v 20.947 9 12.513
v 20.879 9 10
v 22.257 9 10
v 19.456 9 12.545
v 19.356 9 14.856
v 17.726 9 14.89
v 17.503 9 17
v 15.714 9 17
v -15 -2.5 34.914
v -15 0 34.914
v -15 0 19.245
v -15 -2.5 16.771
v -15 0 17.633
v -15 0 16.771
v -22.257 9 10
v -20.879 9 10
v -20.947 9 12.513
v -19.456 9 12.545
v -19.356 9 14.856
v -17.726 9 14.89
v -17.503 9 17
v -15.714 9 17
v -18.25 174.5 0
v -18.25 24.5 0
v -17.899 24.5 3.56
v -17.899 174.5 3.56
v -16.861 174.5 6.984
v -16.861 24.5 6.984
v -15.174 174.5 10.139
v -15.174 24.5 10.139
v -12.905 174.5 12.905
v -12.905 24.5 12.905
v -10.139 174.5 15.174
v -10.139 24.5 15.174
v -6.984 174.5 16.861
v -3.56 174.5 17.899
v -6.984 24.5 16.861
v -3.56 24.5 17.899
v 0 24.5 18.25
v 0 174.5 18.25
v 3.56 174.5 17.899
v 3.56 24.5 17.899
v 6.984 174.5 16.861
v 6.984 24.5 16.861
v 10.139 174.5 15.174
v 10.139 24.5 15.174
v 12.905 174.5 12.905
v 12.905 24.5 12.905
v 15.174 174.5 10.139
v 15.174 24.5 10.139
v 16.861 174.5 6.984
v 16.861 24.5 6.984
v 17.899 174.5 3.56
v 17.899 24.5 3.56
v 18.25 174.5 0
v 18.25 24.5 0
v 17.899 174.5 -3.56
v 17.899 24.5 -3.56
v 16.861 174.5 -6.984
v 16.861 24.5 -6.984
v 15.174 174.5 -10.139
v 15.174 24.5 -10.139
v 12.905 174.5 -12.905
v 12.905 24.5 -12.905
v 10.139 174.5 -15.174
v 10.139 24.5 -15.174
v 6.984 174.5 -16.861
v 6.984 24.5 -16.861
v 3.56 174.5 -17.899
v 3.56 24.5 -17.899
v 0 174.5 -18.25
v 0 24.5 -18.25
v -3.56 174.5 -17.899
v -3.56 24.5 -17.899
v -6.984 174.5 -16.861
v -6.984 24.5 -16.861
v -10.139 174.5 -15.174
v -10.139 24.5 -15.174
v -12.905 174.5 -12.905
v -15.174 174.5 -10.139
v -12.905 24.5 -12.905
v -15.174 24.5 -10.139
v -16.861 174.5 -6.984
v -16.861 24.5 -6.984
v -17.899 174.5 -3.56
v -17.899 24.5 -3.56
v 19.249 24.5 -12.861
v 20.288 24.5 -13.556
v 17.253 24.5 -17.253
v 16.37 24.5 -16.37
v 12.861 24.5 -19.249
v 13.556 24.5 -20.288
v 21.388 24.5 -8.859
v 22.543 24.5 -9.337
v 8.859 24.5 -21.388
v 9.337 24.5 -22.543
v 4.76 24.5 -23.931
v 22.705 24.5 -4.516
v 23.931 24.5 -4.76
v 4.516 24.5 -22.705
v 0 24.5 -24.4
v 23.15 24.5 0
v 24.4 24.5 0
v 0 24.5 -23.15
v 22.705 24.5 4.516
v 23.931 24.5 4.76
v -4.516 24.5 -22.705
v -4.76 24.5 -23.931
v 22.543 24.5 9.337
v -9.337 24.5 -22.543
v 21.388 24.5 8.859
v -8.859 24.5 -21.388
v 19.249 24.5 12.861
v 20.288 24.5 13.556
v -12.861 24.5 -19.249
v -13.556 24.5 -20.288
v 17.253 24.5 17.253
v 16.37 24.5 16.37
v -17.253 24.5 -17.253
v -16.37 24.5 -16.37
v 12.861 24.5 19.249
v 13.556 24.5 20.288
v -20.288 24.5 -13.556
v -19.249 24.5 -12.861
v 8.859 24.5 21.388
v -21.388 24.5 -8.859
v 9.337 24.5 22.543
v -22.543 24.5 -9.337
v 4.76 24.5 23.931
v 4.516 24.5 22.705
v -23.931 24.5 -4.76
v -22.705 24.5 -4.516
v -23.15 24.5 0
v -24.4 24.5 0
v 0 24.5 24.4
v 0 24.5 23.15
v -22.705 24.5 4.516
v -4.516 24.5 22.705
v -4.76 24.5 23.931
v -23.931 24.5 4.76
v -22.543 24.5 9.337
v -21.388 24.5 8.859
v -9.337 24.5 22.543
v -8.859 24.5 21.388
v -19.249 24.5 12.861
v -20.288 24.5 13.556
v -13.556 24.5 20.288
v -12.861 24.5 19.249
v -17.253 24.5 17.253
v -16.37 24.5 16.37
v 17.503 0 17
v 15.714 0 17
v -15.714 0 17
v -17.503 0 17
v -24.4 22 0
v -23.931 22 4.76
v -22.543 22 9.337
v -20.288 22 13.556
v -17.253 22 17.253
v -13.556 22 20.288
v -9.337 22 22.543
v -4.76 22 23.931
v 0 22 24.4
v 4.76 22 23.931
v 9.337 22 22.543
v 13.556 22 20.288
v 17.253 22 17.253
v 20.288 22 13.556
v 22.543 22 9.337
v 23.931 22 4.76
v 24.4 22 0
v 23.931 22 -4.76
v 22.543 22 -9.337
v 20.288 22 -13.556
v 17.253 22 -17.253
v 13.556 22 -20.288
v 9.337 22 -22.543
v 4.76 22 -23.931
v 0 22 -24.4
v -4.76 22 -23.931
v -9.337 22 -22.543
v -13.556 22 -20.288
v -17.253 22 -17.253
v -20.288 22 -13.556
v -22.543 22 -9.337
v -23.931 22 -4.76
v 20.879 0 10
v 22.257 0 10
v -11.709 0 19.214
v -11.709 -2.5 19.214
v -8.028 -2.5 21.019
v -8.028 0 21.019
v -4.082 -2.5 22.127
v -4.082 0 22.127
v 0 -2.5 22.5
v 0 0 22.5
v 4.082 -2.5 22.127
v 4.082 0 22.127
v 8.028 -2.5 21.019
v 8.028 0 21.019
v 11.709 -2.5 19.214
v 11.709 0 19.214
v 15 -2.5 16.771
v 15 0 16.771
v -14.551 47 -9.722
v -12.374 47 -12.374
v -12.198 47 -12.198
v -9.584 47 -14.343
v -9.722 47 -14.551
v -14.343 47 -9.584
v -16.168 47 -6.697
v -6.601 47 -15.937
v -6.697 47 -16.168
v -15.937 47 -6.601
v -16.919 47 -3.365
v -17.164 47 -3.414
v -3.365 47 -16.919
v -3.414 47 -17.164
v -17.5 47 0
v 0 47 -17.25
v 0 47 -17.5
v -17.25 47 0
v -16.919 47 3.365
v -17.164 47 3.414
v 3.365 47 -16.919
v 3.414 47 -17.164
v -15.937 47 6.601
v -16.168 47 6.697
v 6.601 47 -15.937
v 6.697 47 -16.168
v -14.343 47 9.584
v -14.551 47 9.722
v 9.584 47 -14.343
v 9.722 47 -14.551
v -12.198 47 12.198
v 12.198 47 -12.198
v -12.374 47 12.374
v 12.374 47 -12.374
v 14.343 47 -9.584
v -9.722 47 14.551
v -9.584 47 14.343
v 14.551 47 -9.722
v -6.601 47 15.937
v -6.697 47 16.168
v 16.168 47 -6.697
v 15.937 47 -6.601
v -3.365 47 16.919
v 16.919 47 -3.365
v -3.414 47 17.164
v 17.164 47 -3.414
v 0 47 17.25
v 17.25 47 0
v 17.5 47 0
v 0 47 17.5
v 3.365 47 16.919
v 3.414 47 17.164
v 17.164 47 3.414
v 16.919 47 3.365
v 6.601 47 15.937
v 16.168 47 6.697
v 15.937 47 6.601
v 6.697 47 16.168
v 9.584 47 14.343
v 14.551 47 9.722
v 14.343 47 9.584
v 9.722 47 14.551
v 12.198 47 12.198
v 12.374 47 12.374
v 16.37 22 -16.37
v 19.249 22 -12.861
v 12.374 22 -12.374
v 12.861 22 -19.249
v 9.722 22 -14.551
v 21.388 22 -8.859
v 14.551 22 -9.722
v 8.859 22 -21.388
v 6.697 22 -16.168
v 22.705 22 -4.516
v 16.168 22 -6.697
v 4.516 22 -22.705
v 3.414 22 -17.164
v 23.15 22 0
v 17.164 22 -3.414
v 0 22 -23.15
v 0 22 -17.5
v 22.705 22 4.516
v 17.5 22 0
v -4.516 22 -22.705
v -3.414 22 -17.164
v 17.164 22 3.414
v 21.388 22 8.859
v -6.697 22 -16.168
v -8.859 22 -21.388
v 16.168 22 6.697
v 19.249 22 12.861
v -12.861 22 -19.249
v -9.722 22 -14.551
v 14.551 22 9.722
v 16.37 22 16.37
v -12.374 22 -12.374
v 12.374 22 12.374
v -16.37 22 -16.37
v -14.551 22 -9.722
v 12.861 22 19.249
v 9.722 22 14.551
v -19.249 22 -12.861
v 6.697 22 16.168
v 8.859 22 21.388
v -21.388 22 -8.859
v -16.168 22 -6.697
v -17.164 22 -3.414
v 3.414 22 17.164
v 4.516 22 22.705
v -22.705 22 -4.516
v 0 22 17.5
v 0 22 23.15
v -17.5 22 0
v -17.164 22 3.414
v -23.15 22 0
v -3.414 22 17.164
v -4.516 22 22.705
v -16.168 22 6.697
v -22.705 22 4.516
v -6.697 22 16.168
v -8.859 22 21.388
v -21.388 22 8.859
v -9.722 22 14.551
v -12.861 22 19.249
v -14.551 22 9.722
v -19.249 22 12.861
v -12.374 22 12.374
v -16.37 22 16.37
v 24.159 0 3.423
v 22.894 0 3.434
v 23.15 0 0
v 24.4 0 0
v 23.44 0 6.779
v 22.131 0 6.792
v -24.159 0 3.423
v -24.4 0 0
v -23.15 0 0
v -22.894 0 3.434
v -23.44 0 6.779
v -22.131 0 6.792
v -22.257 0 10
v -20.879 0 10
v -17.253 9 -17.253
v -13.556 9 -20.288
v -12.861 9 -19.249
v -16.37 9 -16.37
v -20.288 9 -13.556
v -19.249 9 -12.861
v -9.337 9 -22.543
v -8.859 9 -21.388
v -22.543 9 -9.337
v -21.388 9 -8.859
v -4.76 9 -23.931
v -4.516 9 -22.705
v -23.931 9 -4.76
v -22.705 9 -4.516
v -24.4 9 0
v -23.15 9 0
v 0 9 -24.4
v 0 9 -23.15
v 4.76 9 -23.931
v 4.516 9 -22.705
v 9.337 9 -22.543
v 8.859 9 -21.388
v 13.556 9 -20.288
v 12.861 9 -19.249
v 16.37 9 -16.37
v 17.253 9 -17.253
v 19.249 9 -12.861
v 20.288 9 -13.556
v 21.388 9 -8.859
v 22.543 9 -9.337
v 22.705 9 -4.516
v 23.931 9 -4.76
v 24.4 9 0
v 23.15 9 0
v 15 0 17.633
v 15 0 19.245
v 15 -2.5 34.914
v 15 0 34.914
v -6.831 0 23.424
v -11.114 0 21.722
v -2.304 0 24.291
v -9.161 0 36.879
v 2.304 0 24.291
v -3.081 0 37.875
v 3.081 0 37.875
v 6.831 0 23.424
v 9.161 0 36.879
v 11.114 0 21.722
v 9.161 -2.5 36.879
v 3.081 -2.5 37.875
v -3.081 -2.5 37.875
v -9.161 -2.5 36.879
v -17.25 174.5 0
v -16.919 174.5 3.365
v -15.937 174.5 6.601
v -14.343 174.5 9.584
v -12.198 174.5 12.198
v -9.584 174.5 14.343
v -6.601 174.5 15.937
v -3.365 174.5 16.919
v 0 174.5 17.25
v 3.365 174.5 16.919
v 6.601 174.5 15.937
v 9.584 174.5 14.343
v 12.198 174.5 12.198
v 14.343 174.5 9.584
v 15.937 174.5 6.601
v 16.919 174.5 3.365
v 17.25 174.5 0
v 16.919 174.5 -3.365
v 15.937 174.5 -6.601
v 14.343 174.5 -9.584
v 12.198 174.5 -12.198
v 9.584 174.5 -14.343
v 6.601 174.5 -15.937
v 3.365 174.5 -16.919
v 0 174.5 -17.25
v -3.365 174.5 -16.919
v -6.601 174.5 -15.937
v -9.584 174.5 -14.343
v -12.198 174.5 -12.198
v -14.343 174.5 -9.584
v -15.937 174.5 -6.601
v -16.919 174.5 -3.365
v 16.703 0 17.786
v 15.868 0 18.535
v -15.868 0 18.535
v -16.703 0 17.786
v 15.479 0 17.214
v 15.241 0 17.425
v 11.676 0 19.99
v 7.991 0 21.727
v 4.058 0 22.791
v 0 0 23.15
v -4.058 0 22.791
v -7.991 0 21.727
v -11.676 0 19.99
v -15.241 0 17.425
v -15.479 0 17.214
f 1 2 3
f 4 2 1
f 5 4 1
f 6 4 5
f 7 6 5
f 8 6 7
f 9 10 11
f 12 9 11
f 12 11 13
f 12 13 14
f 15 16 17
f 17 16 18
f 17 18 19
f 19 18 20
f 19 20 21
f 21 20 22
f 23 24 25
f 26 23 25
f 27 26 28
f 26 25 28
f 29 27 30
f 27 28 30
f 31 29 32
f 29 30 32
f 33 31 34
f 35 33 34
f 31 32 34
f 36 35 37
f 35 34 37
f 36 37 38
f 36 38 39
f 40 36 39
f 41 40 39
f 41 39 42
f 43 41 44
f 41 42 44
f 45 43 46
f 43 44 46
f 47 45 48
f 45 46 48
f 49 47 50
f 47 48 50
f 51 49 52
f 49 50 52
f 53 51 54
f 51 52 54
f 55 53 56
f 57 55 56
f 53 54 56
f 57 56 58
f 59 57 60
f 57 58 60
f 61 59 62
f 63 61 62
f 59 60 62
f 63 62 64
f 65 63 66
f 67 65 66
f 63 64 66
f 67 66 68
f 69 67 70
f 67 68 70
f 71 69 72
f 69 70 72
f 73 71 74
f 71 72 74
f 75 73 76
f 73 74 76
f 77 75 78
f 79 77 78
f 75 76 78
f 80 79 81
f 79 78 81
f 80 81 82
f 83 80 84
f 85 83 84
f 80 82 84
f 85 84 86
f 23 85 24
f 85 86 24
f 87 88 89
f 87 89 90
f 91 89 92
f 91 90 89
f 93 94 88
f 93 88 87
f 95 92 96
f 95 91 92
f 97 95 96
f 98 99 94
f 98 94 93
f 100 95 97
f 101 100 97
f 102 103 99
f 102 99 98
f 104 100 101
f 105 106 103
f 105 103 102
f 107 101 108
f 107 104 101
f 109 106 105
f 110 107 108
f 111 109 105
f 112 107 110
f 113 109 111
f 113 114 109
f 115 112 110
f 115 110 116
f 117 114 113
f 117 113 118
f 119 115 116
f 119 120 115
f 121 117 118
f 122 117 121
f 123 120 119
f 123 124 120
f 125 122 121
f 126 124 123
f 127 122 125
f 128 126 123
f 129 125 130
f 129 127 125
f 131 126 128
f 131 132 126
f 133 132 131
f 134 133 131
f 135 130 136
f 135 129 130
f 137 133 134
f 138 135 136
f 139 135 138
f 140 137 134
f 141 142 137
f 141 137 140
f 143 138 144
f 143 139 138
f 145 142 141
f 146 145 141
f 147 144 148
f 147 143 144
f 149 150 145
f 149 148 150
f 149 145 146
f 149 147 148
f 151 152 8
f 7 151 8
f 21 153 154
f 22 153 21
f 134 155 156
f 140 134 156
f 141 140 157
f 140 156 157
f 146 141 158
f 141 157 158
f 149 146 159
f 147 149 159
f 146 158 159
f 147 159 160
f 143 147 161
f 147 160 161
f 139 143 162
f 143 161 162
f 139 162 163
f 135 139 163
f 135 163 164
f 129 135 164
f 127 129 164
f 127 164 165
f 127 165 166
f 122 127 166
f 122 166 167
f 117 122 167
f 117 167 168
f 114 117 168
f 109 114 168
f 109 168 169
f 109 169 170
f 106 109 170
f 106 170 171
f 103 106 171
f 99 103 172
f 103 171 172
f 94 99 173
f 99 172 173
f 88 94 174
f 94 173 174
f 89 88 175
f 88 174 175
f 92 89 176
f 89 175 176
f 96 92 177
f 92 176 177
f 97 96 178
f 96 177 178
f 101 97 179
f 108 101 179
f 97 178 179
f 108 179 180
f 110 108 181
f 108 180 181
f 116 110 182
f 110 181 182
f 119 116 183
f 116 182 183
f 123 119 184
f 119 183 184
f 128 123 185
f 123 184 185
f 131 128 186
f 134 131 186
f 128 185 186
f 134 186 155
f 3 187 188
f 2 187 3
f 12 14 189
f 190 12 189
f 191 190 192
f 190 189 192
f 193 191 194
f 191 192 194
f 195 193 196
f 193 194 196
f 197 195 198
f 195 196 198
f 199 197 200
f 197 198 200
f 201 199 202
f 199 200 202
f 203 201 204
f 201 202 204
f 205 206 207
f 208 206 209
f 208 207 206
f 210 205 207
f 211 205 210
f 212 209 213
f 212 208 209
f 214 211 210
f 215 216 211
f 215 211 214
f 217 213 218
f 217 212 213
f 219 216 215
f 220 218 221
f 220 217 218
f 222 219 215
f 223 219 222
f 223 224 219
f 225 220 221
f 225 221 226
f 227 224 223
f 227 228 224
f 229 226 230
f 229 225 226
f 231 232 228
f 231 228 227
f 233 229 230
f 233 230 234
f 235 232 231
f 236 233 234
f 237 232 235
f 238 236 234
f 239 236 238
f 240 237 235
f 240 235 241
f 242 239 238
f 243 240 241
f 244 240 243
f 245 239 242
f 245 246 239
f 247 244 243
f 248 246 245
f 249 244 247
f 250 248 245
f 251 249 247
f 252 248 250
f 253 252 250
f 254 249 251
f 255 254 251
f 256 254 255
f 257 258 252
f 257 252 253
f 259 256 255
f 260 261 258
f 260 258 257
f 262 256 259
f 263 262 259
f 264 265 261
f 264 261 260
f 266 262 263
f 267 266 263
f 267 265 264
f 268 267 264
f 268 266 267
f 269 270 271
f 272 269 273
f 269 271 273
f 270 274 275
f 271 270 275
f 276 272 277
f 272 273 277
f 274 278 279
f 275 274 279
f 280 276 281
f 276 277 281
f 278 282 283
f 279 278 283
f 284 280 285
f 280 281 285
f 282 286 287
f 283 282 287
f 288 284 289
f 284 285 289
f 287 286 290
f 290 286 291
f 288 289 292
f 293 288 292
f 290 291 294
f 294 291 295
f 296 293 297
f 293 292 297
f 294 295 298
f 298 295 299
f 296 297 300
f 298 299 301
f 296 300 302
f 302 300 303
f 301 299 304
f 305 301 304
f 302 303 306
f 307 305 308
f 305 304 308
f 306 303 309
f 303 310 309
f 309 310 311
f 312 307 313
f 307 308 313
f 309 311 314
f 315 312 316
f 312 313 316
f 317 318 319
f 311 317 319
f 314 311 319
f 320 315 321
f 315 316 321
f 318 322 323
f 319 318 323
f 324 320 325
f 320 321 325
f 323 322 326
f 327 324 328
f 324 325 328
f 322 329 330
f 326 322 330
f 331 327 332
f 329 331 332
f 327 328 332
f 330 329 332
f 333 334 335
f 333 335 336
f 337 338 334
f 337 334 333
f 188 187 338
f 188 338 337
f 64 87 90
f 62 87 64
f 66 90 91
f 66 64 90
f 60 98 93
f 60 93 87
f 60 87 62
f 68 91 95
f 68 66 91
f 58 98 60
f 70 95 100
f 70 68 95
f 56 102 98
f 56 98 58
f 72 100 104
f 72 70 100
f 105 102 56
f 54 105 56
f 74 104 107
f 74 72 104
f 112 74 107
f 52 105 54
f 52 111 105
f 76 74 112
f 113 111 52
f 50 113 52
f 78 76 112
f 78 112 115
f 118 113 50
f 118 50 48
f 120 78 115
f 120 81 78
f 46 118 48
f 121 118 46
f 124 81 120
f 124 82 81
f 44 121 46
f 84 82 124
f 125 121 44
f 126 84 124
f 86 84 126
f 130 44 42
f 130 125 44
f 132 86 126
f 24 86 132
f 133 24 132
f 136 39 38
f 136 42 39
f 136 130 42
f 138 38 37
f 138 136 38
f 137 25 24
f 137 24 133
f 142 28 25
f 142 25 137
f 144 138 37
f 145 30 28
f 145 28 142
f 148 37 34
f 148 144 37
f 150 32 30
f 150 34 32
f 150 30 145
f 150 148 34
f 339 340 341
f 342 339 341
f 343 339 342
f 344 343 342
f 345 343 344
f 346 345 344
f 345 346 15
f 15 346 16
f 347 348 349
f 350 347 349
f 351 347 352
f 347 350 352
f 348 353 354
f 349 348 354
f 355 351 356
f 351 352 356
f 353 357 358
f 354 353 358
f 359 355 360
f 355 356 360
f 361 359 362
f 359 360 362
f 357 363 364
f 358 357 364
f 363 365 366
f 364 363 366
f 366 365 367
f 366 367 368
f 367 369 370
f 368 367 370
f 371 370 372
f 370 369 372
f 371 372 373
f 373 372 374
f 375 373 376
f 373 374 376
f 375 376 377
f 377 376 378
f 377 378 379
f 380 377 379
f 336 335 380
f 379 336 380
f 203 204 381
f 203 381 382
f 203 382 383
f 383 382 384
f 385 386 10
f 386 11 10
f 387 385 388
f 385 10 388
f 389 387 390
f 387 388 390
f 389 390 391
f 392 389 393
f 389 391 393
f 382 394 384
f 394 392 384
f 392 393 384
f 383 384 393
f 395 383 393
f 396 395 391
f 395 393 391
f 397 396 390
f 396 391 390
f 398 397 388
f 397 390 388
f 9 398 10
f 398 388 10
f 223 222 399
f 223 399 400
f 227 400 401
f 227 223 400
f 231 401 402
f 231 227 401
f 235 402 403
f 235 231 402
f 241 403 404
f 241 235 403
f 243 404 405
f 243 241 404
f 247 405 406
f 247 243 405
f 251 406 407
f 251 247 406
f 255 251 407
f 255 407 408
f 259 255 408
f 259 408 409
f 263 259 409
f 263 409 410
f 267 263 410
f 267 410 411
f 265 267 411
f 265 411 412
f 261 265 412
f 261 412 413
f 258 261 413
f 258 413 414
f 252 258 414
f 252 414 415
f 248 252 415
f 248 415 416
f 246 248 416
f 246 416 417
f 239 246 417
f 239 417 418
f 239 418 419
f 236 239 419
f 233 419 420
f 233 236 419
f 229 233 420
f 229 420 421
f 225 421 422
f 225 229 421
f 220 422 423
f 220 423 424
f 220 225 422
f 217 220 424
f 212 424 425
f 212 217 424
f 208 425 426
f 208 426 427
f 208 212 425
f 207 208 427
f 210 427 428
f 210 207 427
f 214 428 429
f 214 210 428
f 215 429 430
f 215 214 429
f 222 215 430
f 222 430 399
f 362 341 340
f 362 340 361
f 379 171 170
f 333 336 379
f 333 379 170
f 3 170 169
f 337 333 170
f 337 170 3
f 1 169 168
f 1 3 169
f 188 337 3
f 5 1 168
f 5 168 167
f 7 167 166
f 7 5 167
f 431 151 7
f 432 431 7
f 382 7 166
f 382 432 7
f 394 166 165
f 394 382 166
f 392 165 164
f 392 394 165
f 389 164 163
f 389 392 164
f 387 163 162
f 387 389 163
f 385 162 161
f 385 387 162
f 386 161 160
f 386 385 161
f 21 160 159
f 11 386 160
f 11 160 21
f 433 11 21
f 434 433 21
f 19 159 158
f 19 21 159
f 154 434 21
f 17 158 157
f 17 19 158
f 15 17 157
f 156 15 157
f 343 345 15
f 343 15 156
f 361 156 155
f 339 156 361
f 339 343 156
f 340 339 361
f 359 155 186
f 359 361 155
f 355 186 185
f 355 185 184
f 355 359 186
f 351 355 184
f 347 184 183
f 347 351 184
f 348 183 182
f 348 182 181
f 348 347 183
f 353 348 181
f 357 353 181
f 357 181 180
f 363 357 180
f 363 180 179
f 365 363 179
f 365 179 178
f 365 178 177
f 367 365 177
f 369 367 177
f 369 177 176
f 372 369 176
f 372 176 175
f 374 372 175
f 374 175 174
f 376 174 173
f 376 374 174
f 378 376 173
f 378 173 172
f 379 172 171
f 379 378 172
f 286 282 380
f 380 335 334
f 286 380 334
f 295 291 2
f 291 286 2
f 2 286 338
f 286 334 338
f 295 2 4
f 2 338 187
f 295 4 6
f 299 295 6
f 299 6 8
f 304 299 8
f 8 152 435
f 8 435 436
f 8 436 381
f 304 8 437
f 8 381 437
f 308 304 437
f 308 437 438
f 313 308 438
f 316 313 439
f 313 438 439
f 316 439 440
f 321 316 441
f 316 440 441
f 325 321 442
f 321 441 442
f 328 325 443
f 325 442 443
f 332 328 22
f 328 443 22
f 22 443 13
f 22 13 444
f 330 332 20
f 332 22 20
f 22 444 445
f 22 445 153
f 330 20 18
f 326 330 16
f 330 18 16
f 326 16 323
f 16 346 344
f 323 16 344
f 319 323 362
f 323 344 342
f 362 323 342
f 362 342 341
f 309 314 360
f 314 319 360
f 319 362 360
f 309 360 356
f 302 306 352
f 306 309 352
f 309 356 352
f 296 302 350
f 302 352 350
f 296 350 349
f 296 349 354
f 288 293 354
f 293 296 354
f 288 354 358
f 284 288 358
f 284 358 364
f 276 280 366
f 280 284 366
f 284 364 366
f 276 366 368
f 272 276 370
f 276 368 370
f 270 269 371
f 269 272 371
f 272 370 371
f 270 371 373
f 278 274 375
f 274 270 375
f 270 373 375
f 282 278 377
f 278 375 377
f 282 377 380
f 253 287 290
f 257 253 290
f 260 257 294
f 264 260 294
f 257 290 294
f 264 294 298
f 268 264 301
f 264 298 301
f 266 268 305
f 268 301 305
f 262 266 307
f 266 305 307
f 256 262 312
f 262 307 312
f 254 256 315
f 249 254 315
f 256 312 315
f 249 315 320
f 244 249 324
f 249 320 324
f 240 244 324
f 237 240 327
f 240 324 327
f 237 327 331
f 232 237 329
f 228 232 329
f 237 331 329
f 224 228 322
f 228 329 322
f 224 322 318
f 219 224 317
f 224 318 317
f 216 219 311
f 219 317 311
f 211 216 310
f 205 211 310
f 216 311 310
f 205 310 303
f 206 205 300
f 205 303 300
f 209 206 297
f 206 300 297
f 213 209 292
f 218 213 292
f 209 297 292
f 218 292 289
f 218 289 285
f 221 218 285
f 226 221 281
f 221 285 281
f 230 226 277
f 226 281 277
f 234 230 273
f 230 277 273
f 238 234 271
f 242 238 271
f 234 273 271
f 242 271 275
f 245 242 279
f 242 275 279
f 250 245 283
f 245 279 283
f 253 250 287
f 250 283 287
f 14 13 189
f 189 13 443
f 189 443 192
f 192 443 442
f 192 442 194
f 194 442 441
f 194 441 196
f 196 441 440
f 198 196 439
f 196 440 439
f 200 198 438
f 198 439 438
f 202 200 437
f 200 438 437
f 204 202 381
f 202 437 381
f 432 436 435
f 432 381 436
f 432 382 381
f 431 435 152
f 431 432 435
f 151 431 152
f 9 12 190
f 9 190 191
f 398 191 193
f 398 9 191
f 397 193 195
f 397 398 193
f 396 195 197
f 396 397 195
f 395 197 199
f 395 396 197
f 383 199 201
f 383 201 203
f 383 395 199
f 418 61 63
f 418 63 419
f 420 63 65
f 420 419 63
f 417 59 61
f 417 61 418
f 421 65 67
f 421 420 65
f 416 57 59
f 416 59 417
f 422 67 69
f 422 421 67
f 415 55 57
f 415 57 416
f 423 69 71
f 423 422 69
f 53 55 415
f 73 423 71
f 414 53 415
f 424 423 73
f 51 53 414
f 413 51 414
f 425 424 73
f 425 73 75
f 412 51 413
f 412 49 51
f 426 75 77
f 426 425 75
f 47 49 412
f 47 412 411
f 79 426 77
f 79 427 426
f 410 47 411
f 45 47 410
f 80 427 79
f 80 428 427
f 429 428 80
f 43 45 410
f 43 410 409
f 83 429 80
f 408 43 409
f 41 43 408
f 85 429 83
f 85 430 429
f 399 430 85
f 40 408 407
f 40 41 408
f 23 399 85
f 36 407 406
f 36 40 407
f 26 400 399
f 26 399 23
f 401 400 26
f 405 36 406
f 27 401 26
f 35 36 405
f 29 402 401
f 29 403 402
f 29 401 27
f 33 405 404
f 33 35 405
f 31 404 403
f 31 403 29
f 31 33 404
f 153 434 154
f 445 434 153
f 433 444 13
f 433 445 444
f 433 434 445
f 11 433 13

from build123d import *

# Parameters (mm, degrees)
F0_R      = 24.4
F0_R_2    = 23.15
F1_DEPTH  = 22
F3_DEPTH  = 2.5
F4_W      = 9
F4_H      = 7
F5_DEPTH  = 25
F6_W      = 9
F6_H      = 7
F7_DEPTH  = 25
F8_W      = 9
F8_H      = 24.4
F9_DEPTH  = 25
F10_W     = 9
F10_H     = 24.4
F11_DEPTH = 25
F13_R     = 24.4
F12_R     = 24.4
F12_R_2   = 23.15
F14_DEPTH = 2.5
F15_R     = 18.25
F15_R_2   = 17.25
F16_DEPTH = 150
F17_R     = 17.5
F18_DEPTH = 25


with BuildPart() as f1:
    # F0 (on Front) → F1 (new body)
    with BuildSketch(Plane.XZ):
        Circle(F0_R)
        Circle(F0_R_2, mode=Mode.SUBTRACT)
    extrude(amount=-F1_DEPTH)

    # F2 (on Front) → F3 (join)
    with BuildSketch(Plane.XZ):
        with BuildLine():
            Line((15, 16.77051), (15, 34.914181))
            ThreePointArc((15, 34.914181), (0, 38), (-15, 34.914181))
            Line((-15, 34.914181), (-15, 16.77051))
            ThreePointArc((-15, 16.77051), (0, 22.5), (15, 16.77051))
        make_face()
    extrude(amount=F3_DEPTH)

    # F4 (on Right) → F5 (cut)
    with BuildSketch(Plane.YZ):
        with Locations((4.5, 13.5)):
            Rectangle(F4_W, F4_H)
    extrude(amount=-F5_DEPTH, mode=Mode.SUBTRACT)

    # F6 (on Right) → F7 (cut)
    with BuildSketch(Plane.YZ):
        with Locations((4.5, 13.5)):
            Rectangle(F6_W, F6_H)
    extrude(amount=F7_DEPTH, mode=Mode.SUBTRACT)

    # F8 (on Right) → F9 (cut)
    with BuildSketch(Plane.YZ):
        with Locations((4.5, -12.2)):
            Rectangle(F8_W, F8_H)
    extrude(amount=-F9_DEPTH, mode=Mode.SUBTRACT)

    # F10 (on Right) → F11 (cut)
    with BuildSketch(Plane.YZ):
        with Locations((4.5, -12.2)):
            Rectangle(F10_W, F10_H)
    extrude(amount=F11_DEPTH, mode=Mode.SUBTRACT)

    # F13 (on face) + F12 (on face) → F14 (join)
    with BuildSketch(Plane(origin=(0, 22, 0), x_dir=(-1, 0, 0), z_dir=(0, 1, 0))):
        Circle(F13_R)
    with BuildSketch(Plane(origin=(0, 22, 0), x_dir=(-1, 0, 0), z_dir=(0, 1, 0))):
        Circle(F12_R)
        Circle(F12_R_2, mode=Mode.SUBTRACT)
    extrude(amount=F14_DEPTH)

    # F15 (on face) → F16 (join)
    with BuildSketch(Plane(origin=(0, 24.5, 0), x_dir=(-1, 0, 0), z_dir=(0, 1, 0))):
        Circle(F15_R)
        Circle(F15_R_2, mode=Mode.SUBTRACT)
    extrude(amount=F16_DEPTH)

    # F17 (on face) → F18 (cut)
    with BuildSketch(Plane.XZ.offset(-22)):
        Circle(F17_R)
    extrude(amount=-F18_DEPTH, mode=Mode.SUBTRACT)


solid = f1.part
